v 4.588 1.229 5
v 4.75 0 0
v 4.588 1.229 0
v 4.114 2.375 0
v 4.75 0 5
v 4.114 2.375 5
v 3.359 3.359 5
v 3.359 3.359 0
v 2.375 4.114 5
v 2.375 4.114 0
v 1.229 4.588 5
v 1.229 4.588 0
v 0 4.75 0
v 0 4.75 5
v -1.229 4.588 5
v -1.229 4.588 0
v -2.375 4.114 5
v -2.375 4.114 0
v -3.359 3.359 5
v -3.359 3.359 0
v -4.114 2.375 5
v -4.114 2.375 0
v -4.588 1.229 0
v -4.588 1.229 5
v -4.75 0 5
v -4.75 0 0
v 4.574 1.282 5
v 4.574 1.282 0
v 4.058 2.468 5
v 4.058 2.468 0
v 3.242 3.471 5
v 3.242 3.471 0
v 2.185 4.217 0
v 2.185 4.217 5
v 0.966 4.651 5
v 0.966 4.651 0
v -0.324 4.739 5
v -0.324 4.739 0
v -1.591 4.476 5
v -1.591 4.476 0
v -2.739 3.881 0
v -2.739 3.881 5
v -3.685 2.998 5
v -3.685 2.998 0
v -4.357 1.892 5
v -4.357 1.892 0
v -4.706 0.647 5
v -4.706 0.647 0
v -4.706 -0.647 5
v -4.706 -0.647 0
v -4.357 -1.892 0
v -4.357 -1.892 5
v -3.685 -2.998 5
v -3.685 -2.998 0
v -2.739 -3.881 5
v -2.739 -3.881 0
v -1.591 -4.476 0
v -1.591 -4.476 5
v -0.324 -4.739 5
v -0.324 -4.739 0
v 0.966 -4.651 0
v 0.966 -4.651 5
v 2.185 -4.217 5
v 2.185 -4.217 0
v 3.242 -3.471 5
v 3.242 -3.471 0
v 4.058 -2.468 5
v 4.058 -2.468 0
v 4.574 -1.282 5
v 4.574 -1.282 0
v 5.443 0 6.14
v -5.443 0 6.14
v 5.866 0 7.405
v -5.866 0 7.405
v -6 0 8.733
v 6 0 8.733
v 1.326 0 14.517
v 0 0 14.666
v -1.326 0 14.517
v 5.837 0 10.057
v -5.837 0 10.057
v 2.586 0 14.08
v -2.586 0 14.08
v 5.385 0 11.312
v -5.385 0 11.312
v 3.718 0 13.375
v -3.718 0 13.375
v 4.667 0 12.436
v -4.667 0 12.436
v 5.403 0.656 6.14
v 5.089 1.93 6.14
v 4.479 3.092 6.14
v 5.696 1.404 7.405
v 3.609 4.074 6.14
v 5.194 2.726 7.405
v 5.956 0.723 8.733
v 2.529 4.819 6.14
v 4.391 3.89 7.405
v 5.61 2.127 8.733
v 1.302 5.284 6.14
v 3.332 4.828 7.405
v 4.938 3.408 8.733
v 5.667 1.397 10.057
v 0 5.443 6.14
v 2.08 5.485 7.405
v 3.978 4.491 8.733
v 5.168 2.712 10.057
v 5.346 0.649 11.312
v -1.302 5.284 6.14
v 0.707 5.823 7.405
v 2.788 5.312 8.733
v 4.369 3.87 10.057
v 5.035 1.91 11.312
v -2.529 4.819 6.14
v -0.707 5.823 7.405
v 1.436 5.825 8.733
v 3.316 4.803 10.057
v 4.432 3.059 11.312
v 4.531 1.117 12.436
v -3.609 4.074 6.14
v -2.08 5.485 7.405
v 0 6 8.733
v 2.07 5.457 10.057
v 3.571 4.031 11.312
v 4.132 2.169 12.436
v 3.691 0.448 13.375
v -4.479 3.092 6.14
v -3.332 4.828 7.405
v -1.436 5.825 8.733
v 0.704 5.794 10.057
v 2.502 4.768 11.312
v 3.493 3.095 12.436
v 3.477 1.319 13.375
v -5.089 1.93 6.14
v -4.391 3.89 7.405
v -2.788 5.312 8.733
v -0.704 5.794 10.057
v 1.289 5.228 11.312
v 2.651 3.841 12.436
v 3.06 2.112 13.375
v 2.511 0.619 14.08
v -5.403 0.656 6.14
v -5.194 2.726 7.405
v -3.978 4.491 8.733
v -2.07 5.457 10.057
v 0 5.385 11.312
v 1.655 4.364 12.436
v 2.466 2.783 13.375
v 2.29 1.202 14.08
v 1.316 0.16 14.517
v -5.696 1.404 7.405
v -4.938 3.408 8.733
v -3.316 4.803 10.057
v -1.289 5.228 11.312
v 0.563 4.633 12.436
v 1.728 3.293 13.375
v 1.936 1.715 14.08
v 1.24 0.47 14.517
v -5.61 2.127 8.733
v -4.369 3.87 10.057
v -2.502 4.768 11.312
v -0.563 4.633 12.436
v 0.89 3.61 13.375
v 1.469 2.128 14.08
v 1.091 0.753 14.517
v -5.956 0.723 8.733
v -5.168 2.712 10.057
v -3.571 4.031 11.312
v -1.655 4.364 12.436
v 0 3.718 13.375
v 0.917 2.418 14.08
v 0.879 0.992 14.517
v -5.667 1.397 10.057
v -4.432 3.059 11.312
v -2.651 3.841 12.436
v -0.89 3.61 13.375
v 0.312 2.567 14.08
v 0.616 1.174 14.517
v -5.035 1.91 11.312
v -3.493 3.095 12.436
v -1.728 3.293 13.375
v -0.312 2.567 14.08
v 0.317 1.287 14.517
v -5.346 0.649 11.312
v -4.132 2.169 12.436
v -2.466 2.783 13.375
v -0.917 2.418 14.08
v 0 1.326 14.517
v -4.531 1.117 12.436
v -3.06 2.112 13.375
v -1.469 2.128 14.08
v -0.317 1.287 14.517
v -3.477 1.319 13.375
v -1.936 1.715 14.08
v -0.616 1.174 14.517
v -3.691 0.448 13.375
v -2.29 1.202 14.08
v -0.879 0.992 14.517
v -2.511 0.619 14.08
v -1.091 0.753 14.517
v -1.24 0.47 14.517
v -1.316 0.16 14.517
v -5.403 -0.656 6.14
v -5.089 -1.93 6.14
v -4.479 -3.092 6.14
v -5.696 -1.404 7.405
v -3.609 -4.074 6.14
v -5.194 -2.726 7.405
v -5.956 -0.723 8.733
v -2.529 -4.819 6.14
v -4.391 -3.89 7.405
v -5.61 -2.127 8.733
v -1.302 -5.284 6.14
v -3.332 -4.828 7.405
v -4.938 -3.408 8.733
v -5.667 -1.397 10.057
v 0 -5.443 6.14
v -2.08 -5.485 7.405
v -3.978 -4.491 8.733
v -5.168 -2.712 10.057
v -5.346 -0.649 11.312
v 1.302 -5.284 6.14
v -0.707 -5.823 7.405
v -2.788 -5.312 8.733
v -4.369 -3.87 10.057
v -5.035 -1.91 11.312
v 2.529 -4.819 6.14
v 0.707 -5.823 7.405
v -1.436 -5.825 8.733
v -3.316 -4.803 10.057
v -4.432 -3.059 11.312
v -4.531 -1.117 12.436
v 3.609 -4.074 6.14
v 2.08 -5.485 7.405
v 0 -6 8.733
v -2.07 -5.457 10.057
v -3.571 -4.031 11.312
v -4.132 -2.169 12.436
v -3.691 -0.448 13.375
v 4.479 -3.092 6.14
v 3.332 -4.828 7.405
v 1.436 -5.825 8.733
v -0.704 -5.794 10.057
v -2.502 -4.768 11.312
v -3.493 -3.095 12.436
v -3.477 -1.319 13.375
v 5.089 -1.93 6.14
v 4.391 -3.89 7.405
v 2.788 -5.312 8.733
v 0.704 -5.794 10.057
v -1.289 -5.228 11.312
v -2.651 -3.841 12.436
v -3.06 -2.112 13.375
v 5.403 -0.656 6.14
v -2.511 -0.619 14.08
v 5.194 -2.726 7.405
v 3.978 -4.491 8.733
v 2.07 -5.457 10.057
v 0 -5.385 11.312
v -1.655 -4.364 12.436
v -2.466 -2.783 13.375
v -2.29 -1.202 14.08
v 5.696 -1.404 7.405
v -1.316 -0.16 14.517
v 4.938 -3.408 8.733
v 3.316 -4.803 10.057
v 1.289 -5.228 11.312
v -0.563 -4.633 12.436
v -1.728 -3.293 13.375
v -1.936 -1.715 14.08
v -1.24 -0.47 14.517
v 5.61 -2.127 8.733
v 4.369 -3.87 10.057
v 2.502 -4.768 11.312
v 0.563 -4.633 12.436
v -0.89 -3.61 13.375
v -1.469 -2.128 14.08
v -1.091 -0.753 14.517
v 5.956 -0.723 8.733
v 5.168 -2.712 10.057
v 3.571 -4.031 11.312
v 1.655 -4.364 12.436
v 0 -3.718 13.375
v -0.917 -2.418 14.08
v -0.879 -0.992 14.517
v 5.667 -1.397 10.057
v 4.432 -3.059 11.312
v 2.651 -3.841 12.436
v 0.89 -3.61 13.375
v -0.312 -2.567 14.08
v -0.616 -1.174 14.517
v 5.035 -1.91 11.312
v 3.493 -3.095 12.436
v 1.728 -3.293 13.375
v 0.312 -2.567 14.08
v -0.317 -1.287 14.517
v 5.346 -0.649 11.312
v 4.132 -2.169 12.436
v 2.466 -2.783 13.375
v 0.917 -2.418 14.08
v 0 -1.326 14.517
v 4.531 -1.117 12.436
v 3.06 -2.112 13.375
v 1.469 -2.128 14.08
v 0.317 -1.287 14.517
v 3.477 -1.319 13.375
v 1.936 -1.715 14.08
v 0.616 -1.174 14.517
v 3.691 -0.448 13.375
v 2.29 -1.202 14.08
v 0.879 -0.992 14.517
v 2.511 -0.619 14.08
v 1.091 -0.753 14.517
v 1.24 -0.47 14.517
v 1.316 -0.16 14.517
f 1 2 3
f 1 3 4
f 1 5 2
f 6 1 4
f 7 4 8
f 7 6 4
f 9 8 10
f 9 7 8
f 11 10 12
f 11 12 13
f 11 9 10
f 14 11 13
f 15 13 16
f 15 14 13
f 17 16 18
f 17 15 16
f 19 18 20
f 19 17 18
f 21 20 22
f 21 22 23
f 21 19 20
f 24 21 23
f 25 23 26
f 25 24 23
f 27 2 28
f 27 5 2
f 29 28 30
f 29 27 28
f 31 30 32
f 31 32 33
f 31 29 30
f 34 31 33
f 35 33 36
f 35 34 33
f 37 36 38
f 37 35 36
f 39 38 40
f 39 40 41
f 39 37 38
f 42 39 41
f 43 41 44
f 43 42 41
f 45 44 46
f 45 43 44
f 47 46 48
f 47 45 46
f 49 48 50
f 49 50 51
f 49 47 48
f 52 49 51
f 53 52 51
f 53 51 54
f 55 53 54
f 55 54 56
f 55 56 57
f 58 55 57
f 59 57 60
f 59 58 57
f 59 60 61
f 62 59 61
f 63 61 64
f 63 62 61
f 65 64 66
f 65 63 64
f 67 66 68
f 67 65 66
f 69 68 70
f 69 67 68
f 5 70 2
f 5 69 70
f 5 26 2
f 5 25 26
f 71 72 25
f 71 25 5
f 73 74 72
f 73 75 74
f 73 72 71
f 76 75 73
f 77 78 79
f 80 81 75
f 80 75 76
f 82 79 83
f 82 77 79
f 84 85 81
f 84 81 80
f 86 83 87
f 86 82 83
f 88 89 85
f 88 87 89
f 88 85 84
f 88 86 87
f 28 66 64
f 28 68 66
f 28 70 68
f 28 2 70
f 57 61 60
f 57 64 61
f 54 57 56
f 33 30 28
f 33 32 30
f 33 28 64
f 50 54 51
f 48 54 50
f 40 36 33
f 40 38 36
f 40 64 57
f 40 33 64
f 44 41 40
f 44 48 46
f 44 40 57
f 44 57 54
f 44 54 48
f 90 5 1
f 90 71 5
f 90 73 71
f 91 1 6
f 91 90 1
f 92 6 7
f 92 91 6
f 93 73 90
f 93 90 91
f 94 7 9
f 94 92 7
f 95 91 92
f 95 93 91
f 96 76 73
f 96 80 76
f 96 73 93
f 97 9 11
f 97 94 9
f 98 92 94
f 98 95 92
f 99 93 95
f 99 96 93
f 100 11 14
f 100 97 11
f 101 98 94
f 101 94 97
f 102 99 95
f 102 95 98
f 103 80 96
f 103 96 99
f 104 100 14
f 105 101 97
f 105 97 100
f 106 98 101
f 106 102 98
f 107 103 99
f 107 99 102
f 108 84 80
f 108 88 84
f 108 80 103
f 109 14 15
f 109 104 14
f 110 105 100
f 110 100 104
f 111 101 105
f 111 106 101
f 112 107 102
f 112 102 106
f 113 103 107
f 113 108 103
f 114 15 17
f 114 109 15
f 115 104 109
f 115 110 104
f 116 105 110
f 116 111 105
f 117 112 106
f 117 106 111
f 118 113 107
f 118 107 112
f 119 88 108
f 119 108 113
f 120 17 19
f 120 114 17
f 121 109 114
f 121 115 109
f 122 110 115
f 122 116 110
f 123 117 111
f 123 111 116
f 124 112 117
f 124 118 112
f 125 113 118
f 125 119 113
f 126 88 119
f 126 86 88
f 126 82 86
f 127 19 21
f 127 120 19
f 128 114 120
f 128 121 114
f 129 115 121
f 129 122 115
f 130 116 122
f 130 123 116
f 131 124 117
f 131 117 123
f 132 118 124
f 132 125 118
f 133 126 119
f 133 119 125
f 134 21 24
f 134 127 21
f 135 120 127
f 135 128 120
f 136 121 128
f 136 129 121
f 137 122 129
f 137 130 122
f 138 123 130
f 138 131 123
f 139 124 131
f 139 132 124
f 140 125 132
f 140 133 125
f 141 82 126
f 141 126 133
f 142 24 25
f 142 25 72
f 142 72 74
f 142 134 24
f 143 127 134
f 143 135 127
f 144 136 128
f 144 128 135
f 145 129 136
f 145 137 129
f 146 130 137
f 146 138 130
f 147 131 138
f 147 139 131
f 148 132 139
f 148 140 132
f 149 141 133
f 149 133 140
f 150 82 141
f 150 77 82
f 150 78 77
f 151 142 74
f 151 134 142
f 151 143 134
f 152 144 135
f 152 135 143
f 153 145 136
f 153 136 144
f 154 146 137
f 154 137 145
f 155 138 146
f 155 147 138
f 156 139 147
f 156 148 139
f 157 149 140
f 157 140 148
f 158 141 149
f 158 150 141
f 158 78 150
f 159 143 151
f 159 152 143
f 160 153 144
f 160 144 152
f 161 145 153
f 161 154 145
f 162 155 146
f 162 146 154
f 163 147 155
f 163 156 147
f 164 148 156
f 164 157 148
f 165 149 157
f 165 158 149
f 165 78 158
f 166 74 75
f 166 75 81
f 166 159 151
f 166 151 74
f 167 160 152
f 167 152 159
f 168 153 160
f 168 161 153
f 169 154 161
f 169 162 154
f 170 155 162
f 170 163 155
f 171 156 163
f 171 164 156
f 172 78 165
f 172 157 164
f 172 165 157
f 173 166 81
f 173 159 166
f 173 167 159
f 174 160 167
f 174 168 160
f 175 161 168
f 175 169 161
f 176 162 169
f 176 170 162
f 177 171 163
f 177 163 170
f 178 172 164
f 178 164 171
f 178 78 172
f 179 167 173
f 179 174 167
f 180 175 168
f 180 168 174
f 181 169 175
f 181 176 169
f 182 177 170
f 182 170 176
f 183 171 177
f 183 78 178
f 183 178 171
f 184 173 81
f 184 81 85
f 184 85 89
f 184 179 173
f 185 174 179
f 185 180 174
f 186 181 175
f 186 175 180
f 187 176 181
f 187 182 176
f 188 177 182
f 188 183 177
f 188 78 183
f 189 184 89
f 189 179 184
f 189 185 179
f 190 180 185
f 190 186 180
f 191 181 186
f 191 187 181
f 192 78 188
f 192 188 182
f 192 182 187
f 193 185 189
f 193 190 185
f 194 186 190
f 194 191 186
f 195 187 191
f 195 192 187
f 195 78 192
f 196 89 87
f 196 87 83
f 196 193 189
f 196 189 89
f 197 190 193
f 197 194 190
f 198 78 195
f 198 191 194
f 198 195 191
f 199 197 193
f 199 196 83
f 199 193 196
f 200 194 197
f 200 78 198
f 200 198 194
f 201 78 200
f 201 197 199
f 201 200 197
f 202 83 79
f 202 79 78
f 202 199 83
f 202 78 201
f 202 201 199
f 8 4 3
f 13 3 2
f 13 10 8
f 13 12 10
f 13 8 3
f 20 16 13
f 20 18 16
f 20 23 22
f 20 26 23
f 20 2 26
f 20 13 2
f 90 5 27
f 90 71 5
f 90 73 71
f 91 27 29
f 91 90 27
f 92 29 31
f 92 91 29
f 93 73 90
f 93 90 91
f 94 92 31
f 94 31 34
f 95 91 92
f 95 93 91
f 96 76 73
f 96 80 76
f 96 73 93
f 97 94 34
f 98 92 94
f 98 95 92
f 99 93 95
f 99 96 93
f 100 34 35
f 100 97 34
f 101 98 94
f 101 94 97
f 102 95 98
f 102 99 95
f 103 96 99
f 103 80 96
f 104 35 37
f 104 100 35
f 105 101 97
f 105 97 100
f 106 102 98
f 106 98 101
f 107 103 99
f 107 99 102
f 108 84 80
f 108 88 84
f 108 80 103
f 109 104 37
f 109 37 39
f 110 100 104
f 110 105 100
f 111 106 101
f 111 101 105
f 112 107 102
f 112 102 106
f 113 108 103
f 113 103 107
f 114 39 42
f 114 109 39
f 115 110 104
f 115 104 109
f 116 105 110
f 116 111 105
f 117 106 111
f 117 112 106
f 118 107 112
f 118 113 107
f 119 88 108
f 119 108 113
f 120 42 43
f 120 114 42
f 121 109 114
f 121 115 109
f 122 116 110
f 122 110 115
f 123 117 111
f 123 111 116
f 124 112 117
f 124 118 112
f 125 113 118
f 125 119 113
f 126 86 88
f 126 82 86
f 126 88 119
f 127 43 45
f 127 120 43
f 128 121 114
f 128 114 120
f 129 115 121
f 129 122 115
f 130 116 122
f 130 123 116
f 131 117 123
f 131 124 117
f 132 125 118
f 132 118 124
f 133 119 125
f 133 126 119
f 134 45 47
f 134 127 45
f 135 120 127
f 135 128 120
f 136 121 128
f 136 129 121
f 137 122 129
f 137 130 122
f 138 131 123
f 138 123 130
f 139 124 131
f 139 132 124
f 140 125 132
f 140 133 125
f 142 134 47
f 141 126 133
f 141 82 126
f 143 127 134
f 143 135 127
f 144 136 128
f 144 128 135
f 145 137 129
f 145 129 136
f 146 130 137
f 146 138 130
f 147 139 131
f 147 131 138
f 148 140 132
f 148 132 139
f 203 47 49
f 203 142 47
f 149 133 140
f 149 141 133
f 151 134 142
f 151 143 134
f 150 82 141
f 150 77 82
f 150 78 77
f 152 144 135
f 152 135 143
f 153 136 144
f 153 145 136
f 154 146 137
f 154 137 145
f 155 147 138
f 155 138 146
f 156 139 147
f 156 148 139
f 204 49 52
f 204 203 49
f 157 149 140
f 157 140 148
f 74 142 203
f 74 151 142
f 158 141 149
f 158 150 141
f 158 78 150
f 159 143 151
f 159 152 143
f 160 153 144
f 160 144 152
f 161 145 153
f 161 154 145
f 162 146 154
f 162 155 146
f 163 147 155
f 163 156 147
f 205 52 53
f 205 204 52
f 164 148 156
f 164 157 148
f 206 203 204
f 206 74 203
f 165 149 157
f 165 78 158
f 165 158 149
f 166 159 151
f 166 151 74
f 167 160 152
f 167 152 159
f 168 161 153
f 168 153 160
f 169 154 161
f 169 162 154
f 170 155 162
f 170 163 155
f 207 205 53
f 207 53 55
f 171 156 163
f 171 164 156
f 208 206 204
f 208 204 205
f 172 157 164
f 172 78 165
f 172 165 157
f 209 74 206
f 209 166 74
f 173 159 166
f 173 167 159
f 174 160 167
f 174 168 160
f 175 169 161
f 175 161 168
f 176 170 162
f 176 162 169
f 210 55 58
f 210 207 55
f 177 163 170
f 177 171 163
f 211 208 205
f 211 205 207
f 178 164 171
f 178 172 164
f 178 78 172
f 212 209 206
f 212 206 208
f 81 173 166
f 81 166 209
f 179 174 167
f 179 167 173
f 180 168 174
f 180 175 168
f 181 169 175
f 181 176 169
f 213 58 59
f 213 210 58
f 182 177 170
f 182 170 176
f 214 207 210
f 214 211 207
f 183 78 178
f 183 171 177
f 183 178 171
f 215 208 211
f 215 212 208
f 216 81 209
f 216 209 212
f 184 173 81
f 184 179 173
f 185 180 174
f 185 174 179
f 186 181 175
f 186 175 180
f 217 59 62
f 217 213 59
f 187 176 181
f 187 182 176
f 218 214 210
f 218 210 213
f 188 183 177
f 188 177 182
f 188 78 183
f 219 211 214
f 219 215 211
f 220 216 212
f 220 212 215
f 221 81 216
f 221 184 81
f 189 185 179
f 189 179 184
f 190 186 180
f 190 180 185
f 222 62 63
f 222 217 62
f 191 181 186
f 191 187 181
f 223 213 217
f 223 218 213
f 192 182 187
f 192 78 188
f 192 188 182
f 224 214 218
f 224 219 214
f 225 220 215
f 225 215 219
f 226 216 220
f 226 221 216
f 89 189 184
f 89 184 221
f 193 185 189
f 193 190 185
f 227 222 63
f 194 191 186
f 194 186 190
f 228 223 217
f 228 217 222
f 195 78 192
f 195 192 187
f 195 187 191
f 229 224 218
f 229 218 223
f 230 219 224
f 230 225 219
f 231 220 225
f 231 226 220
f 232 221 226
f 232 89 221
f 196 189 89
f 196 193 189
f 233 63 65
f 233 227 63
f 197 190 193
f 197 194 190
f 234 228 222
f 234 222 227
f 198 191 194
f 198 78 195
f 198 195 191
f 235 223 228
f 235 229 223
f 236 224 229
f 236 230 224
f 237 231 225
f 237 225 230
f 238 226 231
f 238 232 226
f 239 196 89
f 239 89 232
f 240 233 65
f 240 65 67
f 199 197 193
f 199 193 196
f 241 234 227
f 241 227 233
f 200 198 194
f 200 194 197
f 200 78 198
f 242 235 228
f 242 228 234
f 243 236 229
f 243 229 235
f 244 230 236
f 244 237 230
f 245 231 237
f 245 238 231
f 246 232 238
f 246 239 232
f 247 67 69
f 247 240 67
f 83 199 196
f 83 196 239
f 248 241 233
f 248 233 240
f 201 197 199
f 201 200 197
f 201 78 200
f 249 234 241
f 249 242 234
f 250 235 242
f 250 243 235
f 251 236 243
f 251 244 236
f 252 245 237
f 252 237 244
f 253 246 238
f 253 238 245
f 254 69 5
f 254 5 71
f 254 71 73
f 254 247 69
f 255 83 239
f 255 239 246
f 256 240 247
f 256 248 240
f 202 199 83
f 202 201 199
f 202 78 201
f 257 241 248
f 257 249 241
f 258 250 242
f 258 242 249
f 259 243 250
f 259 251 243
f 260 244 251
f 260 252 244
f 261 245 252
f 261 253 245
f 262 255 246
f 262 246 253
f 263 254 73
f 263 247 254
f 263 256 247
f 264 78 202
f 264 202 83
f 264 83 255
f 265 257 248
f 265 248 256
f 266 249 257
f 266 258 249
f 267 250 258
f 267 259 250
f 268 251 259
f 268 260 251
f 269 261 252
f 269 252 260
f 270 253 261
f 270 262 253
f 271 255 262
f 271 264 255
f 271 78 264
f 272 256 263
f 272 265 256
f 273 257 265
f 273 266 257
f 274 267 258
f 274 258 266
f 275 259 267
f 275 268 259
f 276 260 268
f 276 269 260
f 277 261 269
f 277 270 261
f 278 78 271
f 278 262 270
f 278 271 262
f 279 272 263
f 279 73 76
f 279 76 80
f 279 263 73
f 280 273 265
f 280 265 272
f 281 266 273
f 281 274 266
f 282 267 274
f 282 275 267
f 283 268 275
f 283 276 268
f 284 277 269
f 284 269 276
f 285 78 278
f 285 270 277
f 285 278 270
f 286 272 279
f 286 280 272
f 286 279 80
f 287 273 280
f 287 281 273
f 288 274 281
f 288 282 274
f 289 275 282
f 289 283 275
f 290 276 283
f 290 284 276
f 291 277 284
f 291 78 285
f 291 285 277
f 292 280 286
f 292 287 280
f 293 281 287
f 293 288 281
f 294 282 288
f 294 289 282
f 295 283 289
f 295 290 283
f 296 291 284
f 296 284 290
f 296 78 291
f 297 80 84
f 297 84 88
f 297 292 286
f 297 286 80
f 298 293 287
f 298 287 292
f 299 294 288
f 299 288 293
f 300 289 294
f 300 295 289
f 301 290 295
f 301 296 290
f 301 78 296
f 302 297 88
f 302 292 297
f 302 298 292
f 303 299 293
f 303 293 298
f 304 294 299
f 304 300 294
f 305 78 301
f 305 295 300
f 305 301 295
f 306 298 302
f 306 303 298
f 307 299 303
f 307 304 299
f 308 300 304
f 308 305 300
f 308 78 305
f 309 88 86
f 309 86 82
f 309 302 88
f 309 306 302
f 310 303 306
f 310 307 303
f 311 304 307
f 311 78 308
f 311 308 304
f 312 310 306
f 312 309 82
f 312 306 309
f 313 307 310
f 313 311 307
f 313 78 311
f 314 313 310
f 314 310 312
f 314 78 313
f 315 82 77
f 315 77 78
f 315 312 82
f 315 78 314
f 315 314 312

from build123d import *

# Parameters (mm, degrees)
F2_ANGLE = 180


with BuildPart() as f1:
    # F0 (on Front) → F1 (revolve)
    with BuildSketch(Plane.XZ):
        with BuildLine():
            Line((0, 14.6657195747), (0, 0))
            Line((0, 0), (4.75, 0))
            Line((4.75, 0), (4.75, 5))
            ThreePointArc((4.75, 5), (5.3849009948, 11.3120077819), (0, 14.6657195747))
        make_face()
    revolve(axis=Axis((0, 0, 7.3328597873), (0, 0, 1)))


with BuildPart() as f2:
    # F0 (on Front) → F2 (revolve)
    with BuildSketch(Plane.XZ):
        with BuildLine():
            Line((0, 14.6657195747), (0, 0))
            Line((0, 0), (4.75, 0))
            Line((4.75, 0), (4.75, 5))
            ThreePointArc((4.75, 5), (5.3849009948, 11.3120077819), (0, 14.6657195747))
        make_face()
    revolve(axis=Axis((0, 0, 7.3328597873), (0, 0, 1)), revolution_arc=F2_ANGLE)


solid = Compound([f1.part, f2.part])
